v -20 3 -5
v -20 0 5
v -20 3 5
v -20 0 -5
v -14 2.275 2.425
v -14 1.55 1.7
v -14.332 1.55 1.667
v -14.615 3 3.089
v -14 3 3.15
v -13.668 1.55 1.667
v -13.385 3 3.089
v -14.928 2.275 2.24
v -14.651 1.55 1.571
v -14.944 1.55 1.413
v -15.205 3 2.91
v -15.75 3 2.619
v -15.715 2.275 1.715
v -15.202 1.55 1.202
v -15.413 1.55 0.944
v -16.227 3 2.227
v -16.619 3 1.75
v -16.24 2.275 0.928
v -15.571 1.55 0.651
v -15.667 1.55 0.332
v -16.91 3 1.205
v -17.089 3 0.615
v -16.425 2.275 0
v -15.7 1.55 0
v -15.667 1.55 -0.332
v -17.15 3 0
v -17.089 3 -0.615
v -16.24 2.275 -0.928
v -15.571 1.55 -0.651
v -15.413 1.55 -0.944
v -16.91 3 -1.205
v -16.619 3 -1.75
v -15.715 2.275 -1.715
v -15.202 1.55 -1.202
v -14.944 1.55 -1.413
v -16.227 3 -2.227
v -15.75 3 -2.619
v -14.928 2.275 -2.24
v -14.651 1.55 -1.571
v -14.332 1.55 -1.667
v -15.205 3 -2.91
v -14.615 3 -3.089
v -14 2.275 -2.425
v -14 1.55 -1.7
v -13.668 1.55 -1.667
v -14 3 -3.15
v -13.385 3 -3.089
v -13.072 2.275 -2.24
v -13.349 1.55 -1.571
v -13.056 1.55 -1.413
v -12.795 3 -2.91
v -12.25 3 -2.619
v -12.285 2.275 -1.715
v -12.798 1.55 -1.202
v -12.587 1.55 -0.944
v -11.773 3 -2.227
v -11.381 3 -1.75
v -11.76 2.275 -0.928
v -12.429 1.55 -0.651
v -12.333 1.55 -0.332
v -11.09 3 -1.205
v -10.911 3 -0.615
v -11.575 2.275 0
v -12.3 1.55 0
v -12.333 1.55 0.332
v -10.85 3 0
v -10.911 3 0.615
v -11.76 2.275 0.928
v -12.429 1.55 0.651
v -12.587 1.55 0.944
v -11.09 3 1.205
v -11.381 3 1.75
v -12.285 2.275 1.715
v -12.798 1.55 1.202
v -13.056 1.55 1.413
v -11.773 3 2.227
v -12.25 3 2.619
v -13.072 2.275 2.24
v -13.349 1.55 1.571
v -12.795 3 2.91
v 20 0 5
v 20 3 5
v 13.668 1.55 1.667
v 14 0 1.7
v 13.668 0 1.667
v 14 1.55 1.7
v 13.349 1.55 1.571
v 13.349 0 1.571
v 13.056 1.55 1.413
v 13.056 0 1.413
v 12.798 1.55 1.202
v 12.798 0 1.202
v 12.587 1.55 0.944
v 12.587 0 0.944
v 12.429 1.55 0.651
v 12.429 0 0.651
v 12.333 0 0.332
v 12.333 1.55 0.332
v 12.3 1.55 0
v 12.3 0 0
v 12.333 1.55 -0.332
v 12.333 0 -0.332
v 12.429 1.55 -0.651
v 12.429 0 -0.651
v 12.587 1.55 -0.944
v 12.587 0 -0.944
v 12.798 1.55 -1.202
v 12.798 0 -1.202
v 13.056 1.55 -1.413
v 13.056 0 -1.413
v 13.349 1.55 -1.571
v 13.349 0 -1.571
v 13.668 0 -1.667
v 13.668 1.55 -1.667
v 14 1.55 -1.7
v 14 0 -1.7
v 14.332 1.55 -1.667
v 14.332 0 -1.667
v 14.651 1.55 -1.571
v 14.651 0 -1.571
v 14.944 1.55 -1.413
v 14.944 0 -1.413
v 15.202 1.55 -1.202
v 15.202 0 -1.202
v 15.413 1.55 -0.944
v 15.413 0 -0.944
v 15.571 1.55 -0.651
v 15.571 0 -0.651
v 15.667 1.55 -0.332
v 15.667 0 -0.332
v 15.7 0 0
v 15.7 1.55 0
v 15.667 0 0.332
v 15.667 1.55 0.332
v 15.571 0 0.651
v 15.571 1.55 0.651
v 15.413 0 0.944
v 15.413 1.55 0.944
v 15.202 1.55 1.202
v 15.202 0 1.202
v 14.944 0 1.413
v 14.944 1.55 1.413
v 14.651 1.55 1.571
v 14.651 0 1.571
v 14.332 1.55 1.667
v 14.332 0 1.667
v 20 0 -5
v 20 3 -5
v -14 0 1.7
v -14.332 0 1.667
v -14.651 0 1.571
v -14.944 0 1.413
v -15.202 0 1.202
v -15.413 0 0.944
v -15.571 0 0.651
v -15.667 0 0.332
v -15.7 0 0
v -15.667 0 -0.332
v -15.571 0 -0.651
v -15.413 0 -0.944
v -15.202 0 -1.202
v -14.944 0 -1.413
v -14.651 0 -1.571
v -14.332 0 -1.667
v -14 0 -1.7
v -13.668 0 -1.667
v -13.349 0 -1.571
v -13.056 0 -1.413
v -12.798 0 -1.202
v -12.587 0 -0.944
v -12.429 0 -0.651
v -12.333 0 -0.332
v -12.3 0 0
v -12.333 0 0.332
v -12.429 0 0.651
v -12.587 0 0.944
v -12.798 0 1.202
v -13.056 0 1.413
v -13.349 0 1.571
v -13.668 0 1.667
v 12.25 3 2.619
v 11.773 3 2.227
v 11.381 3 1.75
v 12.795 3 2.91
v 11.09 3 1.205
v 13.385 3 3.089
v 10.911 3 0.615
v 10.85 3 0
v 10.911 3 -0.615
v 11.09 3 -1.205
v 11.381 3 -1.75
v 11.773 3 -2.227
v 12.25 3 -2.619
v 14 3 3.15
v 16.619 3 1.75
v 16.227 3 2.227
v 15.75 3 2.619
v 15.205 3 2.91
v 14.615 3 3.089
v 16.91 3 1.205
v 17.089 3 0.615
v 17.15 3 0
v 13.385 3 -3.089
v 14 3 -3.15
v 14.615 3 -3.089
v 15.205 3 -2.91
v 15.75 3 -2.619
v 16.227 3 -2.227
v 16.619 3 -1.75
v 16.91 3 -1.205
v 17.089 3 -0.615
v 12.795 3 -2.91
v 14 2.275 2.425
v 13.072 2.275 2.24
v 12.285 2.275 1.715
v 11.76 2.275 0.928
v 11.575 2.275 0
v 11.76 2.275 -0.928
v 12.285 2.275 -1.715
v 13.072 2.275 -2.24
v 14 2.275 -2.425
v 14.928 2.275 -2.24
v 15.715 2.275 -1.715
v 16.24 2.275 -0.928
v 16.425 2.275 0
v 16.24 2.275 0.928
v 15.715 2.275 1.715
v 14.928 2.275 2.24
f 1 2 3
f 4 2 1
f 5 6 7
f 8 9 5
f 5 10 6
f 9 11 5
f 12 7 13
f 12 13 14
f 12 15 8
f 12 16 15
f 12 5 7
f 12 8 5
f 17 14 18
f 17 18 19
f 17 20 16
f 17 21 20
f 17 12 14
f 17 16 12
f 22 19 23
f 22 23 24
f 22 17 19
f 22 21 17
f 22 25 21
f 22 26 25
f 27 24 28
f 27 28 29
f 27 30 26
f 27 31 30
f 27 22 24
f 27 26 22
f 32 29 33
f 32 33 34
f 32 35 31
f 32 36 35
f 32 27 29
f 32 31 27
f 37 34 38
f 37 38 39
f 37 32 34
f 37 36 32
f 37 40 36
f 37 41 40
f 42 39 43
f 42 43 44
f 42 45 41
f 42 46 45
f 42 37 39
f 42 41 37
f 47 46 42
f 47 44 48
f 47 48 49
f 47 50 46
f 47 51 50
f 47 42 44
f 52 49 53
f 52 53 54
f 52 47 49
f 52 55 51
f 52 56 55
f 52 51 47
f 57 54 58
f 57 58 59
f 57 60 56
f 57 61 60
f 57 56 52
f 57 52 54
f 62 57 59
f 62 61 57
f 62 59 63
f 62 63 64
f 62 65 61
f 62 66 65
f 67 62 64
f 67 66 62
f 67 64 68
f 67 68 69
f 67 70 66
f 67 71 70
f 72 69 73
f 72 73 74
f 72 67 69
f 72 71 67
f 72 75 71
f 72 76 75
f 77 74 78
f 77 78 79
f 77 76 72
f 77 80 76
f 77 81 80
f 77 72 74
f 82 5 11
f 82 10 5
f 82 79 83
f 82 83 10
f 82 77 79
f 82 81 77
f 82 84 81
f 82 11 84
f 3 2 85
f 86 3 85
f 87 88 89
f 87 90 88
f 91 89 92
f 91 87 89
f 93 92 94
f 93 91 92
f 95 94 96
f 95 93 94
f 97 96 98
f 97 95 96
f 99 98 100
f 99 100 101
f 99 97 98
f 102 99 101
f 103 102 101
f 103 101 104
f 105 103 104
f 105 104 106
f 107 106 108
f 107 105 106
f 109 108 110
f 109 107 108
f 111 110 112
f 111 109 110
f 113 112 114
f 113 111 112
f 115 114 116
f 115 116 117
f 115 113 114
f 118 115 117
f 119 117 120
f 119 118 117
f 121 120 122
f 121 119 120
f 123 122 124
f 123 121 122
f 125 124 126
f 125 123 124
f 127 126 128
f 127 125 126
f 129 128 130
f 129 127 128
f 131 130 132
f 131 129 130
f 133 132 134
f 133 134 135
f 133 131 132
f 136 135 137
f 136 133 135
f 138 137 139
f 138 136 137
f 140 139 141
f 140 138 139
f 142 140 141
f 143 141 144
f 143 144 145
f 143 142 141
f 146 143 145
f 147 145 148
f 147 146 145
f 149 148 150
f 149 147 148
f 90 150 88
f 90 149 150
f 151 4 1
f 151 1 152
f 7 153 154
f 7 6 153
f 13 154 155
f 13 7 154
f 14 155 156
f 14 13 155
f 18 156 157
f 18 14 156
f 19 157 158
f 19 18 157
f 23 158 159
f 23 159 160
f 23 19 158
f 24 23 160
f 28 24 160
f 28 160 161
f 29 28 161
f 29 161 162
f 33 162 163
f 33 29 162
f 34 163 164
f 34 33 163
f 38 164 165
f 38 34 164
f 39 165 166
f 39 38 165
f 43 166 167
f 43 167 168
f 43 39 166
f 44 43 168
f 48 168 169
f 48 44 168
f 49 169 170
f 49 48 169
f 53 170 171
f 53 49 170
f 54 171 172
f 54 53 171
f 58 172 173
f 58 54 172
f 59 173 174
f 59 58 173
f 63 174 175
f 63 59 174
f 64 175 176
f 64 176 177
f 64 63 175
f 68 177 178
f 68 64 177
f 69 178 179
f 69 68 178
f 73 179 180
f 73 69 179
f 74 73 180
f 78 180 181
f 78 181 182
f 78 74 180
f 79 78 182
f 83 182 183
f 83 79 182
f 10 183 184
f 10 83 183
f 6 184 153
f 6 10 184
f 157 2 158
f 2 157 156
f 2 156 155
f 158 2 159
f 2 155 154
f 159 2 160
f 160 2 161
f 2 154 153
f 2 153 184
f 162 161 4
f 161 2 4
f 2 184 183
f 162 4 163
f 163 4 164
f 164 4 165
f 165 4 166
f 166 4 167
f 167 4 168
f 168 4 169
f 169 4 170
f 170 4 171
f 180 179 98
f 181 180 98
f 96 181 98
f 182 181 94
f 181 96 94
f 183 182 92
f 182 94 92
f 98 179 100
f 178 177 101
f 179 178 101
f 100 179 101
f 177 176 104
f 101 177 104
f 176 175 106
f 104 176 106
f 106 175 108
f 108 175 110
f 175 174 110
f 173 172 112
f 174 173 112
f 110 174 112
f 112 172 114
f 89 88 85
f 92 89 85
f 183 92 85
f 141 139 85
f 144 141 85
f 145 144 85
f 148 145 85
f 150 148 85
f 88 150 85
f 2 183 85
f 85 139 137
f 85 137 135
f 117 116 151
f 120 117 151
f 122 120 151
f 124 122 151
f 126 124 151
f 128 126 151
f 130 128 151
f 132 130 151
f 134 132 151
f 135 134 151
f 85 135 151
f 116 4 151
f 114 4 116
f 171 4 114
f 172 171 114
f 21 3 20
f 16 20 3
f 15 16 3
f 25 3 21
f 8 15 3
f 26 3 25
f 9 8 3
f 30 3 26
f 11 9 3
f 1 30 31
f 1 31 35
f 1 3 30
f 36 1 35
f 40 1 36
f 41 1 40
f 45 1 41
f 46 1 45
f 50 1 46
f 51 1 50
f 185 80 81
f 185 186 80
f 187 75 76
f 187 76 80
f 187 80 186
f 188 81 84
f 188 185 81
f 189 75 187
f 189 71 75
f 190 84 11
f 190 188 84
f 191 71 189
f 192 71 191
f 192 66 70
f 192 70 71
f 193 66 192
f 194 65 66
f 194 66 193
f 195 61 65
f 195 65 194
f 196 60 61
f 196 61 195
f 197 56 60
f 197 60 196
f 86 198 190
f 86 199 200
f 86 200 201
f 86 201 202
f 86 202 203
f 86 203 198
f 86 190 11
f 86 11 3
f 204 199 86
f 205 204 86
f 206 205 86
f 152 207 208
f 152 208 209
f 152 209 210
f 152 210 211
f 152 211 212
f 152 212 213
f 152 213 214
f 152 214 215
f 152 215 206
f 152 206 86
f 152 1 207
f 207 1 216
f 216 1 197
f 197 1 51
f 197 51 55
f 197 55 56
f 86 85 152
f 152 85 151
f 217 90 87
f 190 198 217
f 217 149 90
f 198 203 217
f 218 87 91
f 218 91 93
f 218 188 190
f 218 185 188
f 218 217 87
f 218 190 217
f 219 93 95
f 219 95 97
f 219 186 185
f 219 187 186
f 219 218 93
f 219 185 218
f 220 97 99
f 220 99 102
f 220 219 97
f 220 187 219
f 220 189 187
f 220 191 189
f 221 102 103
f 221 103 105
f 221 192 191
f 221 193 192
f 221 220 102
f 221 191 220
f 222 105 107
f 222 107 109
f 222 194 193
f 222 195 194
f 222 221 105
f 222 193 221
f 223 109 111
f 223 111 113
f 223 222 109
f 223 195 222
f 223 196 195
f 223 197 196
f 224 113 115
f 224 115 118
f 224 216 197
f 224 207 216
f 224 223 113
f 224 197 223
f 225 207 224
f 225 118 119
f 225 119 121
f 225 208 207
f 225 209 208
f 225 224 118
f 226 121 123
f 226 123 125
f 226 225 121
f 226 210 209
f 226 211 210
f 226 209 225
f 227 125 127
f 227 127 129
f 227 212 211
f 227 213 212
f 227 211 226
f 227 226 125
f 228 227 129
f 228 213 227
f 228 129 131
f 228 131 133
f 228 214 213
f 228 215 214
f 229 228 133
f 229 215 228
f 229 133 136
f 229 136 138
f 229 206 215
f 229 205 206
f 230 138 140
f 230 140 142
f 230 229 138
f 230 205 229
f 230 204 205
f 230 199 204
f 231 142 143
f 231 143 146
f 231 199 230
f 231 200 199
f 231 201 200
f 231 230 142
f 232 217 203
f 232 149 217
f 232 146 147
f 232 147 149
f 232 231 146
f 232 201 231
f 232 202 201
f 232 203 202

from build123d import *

# Parameters (mm, degrees)
SKETCH1_W                                    = 40
SKETCH1_H                                    = 10
BOSS_EXTRUDE1_DEPTH                          = 3
CSK_FOR_M3_COUNTERSUNK_FLAT_HEAD_SCR_2_COUNT = 2
CSK_FOR_M3_COUNTERSUNK_FLAT_HEAD_SCR_2_PITCH = 28


with BuildPart() as part:
    # Sketch1 → Boss-Extrude1 (new body)
    with BuildSketch(Plane(origin=(0, 0, 0), x_dir=(1, 0, 0), z_dir=(0, 1, 0))):
        Rectangle(SKETCH1_W, SKETCH1_H)
    extrude(amount=BOSS_EXTRUDE1_DEPTH)

    # Sketch3 → CSK for M3 Countersunk Flat Head Screw1 (revolve, cut)
    with BuildSketch(Plane(origin=(-14, 3, 0), x_dir=(0, 0, 1), z_dir=(1, 0, 0))):
        Polygon((0, 0), (0, 3), (1.7, 3), (1.7, 1.45), (3.15, 0), align=None)
    csk_for_m3_countersunk_flat_head_screw1 = revolve(axis=Axis((-14, 9.35, 0), (0, -1, 0)), mode=Mode.SUBTRACT)

    # CSK for M3 Countersunk Flat Head Scr 2: CSK for M3 Countersunk Flat Head Screw1 ×2
    with Locations(*[(i * CSK_FOR_M3_COUNTERSUNK_FLAT_HEAD_SCR_2_PITCH, 0, 0) for i in range(1, CSK_FOR_M3_COUNTERSUNK_FLAT_HEAD_SCR_2_COUNT)]):
        add(csk_for_m3_countersunk_flat_head_screw1, mode=Mode.SUBTRACT)


solid = part.part
